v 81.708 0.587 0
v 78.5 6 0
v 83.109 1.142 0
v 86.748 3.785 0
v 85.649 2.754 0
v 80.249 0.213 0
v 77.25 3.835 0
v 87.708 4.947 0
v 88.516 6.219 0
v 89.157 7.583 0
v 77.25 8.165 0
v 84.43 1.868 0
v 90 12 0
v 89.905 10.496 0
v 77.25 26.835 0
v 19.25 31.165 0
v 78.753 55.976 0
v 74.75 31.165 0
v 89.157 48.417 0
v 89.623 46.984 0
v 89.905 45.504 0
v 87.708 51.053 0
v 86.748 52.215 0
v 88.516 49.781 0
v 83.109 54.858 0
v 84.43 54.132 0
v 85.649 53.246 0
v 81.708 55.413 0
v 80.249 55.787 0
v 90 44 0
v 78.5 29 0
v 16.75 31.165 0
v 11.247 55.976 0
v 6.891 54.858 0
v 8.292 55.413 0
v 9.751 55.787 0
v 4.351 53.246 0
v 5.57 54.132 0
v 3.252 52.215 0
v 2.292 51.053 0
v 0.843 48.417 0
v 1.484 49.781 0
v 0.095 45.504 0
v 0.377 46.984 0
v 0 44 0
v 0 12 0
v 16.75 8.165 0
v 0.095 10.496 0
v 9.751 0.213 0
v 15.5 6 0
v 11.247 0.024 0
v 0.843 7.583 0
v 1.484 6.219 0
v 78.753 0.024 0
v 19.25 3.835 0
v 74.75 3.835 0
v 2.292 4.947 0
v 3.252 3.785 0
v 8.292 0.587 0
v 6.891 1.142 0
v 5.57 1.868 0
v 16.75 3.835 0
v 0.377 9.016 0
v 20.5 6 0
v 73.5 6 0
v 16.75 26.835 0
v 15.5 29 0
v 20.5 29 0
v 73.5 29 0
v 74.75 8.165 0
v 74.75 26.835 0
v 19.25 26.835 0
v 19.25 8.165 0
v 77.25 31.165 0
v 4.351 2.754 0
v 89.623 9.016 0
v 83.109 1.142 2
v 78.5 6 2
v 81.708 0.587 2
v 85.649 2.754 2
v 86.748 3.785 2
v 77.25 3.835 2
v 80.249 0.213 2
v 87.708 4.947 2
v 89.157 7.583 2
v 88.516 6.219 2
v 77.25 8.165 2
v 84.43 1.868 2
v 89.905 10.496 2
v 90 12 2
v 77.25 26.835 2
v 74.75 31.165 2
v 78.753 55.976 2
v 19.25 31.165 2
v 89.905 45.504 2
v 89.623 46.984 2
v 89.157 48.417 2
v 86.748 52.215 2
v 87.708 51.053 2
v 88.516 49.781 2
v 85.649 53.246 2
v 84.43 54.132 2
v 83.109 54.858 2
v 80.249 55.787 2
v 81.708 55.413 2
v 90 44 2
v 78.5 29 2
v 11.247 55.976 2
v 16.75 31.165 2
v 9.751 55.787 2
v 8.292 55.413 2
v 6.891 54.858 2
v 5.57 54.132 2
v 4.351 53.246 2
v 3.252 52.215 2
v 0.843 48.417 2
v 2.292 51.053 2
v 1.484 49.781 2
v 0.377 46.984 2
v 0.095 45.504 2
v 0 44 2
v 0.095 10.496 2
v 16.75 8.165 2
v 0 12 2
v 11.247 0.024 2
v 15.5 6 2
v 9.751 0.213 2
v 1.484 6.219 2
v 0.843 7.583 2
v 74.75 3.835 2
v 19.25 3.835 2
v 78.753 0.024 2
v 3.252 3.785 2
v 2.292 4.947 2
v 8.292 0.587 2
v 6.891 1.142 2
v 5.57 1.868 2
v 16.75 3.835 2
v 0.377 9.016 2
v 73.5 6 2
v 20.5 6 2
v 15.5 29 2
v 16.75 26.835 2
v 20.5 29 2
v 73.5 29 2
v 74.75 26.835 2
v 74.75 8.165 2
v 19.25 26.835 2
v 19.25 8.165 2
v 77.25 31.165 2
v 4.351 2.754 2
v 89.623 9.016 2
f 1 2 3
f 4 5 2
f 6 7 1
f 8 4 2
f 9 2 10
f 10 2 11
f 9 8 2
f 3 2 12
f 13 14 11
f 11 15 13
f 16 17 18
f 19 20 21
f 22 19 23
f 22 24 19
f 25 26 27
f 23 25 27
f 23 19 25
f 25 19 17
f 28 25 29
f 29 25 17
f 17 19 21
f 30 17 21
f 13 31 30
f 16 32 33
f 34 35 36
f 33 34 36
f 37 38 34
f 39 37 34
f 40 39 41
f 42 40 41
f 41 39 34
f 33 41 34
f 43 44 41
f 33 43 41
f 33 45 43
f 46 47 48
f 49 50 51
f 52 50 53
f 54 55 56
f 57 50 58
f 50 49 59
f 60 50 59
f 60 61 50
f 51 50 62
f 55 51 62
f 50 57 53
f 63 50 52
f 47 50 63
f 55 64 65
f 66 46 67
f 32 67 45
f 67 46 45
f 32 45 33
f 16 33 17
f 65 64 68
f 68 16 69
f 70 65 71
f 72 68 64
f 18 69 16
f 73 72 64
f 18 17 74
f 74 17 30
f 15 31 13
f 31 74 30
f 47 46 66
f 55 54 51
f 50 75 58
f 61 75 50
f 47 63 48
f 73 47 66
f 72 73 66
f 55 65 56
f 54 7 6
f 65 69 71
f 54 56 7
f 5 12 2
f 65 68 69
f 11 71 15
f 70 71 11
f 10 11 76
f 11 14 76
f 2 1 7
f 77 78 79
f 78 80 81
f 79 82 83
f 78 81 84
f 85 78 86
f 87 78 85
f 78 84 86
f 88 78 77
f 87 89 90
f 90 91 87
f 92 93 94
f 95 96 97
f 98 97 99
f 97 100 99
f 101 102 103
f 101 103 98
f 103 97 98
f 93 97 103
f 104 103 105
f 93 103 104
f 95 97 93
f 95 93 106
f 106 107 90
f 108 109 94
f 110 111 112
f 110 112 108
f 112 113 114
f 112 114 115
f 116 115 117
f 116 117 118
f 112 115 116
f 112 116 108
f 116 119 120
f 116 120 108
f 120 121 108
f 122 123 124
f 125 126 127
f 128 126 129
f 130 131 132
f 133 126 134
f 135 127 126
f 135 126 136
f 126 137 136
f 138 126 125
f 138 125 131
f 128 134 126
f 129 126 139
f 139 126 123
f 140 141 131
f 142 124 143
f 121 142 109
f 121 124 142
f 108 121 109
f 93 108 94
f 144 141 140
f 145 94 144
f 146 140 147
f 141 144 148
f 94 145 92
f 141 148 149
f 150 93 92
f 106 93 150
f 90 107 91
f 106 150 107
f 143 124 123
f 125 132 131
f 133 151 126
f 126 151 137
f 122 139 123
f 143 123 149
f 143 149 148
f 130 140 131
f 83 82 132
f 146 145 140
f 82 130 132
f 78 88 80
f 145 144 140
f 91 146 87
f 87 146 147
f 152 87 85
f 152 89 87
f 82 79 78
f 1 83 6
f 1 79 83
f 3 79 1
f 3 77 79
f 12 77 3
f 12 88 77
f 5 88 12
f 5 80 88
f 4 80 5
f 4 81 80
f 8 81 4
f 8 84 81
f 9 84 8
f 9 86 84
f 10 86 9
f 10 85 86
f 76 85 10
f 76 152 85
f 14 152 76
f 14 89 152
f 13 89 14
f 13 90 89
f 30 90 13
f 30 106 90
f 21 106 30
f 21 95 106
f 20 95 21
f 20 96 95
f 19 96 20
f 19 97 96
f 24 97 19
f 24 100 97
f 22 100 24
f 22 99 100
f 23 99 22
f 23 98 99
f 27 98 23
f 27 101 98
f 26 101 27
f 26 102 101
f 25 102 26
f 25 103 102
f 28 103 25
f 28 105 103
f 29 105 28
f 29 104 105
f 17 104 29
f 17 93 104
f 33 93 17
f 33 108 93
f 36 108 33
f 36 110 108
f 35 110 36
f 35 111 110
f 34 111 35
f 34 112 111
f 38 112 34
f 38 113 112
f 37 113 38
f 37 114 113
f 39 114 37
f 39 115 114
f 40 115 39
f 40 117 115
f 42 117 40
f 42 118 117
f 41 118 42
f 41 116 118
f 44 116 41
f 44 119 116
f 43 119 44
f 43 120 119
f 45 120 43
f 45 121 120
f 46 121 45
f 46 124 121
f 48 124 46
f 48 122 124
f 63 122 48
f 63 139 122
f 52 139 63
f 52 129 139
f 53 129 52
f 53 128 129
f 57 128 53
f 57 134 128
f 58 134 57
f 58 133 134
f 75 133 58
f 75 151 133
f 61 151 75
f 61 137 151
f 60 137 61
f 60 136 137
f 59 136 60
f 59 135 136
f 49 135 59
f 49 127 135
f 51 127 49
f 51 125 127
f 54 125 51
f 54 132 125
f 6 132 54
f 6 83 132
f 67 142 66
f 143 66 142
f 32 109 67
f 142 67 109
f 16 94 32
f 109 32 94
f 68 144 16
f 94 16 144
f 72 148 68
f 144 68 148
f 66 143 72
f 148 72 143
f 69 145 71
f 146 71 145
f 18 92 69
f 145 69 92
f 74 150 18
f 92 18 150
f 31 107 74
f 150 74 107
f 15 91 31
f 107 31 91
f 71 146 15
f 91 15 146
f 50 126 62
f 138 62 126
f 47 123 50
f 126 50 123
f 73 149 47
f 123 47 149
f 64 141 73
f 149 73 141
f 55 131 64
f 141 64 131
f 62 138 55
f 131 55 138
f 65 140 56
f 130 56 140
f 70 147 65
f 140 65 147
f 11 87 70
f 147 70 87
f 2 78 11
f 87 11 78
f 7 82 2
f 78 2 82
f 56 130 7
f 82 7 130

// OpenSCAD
$fn = 50;

corner_radius = 12;
width = 90 - 2*corner_radius;
height = 56 - 2*corner_radius;

nut_diameter = 5;
nut_height = 2;

pi_zero_mount_x_distance = 58;
pi_zero_mount_y_distance = 23;
pi_zero_mount_x_offset = 3.5;
pi_zero_mount_y_offset = 3.5;

module peppermint_bottom_plate(){
    minkowski(){
        square([width, height]);
        circle(corner_radius
    );
    }
}

module nut_hole(){
    circle(d = nut_diameter, $fn=6);
}

module nut_holes(){
    nut_hole();
    translate([pi_zero_mount_x_distance,0,0]){
        nut_hole();
    }
    translate([0,pi_zero_mount_y_distance,0]){
        nut_hole();
    }
    translate([pi_zero_mount_x_distance,pi_zero_mount_y_distance,0]){
        nut_hole();
    }
}

module peppermint_bottom() {
    translate([corner_radius
, corner_radius
, 0]) {
        linear_extrude(2){
            difference(){
                peppermint_bottom_plate();
                translate([nut_diameter/2 + pi_zero_mount_x_offset, -(nut_diameter/2 + pi_zero_mount_y_offset),0]){
                    nut_holes();
                }
            }
        }
    }
    
}

peppermint_bottom();
